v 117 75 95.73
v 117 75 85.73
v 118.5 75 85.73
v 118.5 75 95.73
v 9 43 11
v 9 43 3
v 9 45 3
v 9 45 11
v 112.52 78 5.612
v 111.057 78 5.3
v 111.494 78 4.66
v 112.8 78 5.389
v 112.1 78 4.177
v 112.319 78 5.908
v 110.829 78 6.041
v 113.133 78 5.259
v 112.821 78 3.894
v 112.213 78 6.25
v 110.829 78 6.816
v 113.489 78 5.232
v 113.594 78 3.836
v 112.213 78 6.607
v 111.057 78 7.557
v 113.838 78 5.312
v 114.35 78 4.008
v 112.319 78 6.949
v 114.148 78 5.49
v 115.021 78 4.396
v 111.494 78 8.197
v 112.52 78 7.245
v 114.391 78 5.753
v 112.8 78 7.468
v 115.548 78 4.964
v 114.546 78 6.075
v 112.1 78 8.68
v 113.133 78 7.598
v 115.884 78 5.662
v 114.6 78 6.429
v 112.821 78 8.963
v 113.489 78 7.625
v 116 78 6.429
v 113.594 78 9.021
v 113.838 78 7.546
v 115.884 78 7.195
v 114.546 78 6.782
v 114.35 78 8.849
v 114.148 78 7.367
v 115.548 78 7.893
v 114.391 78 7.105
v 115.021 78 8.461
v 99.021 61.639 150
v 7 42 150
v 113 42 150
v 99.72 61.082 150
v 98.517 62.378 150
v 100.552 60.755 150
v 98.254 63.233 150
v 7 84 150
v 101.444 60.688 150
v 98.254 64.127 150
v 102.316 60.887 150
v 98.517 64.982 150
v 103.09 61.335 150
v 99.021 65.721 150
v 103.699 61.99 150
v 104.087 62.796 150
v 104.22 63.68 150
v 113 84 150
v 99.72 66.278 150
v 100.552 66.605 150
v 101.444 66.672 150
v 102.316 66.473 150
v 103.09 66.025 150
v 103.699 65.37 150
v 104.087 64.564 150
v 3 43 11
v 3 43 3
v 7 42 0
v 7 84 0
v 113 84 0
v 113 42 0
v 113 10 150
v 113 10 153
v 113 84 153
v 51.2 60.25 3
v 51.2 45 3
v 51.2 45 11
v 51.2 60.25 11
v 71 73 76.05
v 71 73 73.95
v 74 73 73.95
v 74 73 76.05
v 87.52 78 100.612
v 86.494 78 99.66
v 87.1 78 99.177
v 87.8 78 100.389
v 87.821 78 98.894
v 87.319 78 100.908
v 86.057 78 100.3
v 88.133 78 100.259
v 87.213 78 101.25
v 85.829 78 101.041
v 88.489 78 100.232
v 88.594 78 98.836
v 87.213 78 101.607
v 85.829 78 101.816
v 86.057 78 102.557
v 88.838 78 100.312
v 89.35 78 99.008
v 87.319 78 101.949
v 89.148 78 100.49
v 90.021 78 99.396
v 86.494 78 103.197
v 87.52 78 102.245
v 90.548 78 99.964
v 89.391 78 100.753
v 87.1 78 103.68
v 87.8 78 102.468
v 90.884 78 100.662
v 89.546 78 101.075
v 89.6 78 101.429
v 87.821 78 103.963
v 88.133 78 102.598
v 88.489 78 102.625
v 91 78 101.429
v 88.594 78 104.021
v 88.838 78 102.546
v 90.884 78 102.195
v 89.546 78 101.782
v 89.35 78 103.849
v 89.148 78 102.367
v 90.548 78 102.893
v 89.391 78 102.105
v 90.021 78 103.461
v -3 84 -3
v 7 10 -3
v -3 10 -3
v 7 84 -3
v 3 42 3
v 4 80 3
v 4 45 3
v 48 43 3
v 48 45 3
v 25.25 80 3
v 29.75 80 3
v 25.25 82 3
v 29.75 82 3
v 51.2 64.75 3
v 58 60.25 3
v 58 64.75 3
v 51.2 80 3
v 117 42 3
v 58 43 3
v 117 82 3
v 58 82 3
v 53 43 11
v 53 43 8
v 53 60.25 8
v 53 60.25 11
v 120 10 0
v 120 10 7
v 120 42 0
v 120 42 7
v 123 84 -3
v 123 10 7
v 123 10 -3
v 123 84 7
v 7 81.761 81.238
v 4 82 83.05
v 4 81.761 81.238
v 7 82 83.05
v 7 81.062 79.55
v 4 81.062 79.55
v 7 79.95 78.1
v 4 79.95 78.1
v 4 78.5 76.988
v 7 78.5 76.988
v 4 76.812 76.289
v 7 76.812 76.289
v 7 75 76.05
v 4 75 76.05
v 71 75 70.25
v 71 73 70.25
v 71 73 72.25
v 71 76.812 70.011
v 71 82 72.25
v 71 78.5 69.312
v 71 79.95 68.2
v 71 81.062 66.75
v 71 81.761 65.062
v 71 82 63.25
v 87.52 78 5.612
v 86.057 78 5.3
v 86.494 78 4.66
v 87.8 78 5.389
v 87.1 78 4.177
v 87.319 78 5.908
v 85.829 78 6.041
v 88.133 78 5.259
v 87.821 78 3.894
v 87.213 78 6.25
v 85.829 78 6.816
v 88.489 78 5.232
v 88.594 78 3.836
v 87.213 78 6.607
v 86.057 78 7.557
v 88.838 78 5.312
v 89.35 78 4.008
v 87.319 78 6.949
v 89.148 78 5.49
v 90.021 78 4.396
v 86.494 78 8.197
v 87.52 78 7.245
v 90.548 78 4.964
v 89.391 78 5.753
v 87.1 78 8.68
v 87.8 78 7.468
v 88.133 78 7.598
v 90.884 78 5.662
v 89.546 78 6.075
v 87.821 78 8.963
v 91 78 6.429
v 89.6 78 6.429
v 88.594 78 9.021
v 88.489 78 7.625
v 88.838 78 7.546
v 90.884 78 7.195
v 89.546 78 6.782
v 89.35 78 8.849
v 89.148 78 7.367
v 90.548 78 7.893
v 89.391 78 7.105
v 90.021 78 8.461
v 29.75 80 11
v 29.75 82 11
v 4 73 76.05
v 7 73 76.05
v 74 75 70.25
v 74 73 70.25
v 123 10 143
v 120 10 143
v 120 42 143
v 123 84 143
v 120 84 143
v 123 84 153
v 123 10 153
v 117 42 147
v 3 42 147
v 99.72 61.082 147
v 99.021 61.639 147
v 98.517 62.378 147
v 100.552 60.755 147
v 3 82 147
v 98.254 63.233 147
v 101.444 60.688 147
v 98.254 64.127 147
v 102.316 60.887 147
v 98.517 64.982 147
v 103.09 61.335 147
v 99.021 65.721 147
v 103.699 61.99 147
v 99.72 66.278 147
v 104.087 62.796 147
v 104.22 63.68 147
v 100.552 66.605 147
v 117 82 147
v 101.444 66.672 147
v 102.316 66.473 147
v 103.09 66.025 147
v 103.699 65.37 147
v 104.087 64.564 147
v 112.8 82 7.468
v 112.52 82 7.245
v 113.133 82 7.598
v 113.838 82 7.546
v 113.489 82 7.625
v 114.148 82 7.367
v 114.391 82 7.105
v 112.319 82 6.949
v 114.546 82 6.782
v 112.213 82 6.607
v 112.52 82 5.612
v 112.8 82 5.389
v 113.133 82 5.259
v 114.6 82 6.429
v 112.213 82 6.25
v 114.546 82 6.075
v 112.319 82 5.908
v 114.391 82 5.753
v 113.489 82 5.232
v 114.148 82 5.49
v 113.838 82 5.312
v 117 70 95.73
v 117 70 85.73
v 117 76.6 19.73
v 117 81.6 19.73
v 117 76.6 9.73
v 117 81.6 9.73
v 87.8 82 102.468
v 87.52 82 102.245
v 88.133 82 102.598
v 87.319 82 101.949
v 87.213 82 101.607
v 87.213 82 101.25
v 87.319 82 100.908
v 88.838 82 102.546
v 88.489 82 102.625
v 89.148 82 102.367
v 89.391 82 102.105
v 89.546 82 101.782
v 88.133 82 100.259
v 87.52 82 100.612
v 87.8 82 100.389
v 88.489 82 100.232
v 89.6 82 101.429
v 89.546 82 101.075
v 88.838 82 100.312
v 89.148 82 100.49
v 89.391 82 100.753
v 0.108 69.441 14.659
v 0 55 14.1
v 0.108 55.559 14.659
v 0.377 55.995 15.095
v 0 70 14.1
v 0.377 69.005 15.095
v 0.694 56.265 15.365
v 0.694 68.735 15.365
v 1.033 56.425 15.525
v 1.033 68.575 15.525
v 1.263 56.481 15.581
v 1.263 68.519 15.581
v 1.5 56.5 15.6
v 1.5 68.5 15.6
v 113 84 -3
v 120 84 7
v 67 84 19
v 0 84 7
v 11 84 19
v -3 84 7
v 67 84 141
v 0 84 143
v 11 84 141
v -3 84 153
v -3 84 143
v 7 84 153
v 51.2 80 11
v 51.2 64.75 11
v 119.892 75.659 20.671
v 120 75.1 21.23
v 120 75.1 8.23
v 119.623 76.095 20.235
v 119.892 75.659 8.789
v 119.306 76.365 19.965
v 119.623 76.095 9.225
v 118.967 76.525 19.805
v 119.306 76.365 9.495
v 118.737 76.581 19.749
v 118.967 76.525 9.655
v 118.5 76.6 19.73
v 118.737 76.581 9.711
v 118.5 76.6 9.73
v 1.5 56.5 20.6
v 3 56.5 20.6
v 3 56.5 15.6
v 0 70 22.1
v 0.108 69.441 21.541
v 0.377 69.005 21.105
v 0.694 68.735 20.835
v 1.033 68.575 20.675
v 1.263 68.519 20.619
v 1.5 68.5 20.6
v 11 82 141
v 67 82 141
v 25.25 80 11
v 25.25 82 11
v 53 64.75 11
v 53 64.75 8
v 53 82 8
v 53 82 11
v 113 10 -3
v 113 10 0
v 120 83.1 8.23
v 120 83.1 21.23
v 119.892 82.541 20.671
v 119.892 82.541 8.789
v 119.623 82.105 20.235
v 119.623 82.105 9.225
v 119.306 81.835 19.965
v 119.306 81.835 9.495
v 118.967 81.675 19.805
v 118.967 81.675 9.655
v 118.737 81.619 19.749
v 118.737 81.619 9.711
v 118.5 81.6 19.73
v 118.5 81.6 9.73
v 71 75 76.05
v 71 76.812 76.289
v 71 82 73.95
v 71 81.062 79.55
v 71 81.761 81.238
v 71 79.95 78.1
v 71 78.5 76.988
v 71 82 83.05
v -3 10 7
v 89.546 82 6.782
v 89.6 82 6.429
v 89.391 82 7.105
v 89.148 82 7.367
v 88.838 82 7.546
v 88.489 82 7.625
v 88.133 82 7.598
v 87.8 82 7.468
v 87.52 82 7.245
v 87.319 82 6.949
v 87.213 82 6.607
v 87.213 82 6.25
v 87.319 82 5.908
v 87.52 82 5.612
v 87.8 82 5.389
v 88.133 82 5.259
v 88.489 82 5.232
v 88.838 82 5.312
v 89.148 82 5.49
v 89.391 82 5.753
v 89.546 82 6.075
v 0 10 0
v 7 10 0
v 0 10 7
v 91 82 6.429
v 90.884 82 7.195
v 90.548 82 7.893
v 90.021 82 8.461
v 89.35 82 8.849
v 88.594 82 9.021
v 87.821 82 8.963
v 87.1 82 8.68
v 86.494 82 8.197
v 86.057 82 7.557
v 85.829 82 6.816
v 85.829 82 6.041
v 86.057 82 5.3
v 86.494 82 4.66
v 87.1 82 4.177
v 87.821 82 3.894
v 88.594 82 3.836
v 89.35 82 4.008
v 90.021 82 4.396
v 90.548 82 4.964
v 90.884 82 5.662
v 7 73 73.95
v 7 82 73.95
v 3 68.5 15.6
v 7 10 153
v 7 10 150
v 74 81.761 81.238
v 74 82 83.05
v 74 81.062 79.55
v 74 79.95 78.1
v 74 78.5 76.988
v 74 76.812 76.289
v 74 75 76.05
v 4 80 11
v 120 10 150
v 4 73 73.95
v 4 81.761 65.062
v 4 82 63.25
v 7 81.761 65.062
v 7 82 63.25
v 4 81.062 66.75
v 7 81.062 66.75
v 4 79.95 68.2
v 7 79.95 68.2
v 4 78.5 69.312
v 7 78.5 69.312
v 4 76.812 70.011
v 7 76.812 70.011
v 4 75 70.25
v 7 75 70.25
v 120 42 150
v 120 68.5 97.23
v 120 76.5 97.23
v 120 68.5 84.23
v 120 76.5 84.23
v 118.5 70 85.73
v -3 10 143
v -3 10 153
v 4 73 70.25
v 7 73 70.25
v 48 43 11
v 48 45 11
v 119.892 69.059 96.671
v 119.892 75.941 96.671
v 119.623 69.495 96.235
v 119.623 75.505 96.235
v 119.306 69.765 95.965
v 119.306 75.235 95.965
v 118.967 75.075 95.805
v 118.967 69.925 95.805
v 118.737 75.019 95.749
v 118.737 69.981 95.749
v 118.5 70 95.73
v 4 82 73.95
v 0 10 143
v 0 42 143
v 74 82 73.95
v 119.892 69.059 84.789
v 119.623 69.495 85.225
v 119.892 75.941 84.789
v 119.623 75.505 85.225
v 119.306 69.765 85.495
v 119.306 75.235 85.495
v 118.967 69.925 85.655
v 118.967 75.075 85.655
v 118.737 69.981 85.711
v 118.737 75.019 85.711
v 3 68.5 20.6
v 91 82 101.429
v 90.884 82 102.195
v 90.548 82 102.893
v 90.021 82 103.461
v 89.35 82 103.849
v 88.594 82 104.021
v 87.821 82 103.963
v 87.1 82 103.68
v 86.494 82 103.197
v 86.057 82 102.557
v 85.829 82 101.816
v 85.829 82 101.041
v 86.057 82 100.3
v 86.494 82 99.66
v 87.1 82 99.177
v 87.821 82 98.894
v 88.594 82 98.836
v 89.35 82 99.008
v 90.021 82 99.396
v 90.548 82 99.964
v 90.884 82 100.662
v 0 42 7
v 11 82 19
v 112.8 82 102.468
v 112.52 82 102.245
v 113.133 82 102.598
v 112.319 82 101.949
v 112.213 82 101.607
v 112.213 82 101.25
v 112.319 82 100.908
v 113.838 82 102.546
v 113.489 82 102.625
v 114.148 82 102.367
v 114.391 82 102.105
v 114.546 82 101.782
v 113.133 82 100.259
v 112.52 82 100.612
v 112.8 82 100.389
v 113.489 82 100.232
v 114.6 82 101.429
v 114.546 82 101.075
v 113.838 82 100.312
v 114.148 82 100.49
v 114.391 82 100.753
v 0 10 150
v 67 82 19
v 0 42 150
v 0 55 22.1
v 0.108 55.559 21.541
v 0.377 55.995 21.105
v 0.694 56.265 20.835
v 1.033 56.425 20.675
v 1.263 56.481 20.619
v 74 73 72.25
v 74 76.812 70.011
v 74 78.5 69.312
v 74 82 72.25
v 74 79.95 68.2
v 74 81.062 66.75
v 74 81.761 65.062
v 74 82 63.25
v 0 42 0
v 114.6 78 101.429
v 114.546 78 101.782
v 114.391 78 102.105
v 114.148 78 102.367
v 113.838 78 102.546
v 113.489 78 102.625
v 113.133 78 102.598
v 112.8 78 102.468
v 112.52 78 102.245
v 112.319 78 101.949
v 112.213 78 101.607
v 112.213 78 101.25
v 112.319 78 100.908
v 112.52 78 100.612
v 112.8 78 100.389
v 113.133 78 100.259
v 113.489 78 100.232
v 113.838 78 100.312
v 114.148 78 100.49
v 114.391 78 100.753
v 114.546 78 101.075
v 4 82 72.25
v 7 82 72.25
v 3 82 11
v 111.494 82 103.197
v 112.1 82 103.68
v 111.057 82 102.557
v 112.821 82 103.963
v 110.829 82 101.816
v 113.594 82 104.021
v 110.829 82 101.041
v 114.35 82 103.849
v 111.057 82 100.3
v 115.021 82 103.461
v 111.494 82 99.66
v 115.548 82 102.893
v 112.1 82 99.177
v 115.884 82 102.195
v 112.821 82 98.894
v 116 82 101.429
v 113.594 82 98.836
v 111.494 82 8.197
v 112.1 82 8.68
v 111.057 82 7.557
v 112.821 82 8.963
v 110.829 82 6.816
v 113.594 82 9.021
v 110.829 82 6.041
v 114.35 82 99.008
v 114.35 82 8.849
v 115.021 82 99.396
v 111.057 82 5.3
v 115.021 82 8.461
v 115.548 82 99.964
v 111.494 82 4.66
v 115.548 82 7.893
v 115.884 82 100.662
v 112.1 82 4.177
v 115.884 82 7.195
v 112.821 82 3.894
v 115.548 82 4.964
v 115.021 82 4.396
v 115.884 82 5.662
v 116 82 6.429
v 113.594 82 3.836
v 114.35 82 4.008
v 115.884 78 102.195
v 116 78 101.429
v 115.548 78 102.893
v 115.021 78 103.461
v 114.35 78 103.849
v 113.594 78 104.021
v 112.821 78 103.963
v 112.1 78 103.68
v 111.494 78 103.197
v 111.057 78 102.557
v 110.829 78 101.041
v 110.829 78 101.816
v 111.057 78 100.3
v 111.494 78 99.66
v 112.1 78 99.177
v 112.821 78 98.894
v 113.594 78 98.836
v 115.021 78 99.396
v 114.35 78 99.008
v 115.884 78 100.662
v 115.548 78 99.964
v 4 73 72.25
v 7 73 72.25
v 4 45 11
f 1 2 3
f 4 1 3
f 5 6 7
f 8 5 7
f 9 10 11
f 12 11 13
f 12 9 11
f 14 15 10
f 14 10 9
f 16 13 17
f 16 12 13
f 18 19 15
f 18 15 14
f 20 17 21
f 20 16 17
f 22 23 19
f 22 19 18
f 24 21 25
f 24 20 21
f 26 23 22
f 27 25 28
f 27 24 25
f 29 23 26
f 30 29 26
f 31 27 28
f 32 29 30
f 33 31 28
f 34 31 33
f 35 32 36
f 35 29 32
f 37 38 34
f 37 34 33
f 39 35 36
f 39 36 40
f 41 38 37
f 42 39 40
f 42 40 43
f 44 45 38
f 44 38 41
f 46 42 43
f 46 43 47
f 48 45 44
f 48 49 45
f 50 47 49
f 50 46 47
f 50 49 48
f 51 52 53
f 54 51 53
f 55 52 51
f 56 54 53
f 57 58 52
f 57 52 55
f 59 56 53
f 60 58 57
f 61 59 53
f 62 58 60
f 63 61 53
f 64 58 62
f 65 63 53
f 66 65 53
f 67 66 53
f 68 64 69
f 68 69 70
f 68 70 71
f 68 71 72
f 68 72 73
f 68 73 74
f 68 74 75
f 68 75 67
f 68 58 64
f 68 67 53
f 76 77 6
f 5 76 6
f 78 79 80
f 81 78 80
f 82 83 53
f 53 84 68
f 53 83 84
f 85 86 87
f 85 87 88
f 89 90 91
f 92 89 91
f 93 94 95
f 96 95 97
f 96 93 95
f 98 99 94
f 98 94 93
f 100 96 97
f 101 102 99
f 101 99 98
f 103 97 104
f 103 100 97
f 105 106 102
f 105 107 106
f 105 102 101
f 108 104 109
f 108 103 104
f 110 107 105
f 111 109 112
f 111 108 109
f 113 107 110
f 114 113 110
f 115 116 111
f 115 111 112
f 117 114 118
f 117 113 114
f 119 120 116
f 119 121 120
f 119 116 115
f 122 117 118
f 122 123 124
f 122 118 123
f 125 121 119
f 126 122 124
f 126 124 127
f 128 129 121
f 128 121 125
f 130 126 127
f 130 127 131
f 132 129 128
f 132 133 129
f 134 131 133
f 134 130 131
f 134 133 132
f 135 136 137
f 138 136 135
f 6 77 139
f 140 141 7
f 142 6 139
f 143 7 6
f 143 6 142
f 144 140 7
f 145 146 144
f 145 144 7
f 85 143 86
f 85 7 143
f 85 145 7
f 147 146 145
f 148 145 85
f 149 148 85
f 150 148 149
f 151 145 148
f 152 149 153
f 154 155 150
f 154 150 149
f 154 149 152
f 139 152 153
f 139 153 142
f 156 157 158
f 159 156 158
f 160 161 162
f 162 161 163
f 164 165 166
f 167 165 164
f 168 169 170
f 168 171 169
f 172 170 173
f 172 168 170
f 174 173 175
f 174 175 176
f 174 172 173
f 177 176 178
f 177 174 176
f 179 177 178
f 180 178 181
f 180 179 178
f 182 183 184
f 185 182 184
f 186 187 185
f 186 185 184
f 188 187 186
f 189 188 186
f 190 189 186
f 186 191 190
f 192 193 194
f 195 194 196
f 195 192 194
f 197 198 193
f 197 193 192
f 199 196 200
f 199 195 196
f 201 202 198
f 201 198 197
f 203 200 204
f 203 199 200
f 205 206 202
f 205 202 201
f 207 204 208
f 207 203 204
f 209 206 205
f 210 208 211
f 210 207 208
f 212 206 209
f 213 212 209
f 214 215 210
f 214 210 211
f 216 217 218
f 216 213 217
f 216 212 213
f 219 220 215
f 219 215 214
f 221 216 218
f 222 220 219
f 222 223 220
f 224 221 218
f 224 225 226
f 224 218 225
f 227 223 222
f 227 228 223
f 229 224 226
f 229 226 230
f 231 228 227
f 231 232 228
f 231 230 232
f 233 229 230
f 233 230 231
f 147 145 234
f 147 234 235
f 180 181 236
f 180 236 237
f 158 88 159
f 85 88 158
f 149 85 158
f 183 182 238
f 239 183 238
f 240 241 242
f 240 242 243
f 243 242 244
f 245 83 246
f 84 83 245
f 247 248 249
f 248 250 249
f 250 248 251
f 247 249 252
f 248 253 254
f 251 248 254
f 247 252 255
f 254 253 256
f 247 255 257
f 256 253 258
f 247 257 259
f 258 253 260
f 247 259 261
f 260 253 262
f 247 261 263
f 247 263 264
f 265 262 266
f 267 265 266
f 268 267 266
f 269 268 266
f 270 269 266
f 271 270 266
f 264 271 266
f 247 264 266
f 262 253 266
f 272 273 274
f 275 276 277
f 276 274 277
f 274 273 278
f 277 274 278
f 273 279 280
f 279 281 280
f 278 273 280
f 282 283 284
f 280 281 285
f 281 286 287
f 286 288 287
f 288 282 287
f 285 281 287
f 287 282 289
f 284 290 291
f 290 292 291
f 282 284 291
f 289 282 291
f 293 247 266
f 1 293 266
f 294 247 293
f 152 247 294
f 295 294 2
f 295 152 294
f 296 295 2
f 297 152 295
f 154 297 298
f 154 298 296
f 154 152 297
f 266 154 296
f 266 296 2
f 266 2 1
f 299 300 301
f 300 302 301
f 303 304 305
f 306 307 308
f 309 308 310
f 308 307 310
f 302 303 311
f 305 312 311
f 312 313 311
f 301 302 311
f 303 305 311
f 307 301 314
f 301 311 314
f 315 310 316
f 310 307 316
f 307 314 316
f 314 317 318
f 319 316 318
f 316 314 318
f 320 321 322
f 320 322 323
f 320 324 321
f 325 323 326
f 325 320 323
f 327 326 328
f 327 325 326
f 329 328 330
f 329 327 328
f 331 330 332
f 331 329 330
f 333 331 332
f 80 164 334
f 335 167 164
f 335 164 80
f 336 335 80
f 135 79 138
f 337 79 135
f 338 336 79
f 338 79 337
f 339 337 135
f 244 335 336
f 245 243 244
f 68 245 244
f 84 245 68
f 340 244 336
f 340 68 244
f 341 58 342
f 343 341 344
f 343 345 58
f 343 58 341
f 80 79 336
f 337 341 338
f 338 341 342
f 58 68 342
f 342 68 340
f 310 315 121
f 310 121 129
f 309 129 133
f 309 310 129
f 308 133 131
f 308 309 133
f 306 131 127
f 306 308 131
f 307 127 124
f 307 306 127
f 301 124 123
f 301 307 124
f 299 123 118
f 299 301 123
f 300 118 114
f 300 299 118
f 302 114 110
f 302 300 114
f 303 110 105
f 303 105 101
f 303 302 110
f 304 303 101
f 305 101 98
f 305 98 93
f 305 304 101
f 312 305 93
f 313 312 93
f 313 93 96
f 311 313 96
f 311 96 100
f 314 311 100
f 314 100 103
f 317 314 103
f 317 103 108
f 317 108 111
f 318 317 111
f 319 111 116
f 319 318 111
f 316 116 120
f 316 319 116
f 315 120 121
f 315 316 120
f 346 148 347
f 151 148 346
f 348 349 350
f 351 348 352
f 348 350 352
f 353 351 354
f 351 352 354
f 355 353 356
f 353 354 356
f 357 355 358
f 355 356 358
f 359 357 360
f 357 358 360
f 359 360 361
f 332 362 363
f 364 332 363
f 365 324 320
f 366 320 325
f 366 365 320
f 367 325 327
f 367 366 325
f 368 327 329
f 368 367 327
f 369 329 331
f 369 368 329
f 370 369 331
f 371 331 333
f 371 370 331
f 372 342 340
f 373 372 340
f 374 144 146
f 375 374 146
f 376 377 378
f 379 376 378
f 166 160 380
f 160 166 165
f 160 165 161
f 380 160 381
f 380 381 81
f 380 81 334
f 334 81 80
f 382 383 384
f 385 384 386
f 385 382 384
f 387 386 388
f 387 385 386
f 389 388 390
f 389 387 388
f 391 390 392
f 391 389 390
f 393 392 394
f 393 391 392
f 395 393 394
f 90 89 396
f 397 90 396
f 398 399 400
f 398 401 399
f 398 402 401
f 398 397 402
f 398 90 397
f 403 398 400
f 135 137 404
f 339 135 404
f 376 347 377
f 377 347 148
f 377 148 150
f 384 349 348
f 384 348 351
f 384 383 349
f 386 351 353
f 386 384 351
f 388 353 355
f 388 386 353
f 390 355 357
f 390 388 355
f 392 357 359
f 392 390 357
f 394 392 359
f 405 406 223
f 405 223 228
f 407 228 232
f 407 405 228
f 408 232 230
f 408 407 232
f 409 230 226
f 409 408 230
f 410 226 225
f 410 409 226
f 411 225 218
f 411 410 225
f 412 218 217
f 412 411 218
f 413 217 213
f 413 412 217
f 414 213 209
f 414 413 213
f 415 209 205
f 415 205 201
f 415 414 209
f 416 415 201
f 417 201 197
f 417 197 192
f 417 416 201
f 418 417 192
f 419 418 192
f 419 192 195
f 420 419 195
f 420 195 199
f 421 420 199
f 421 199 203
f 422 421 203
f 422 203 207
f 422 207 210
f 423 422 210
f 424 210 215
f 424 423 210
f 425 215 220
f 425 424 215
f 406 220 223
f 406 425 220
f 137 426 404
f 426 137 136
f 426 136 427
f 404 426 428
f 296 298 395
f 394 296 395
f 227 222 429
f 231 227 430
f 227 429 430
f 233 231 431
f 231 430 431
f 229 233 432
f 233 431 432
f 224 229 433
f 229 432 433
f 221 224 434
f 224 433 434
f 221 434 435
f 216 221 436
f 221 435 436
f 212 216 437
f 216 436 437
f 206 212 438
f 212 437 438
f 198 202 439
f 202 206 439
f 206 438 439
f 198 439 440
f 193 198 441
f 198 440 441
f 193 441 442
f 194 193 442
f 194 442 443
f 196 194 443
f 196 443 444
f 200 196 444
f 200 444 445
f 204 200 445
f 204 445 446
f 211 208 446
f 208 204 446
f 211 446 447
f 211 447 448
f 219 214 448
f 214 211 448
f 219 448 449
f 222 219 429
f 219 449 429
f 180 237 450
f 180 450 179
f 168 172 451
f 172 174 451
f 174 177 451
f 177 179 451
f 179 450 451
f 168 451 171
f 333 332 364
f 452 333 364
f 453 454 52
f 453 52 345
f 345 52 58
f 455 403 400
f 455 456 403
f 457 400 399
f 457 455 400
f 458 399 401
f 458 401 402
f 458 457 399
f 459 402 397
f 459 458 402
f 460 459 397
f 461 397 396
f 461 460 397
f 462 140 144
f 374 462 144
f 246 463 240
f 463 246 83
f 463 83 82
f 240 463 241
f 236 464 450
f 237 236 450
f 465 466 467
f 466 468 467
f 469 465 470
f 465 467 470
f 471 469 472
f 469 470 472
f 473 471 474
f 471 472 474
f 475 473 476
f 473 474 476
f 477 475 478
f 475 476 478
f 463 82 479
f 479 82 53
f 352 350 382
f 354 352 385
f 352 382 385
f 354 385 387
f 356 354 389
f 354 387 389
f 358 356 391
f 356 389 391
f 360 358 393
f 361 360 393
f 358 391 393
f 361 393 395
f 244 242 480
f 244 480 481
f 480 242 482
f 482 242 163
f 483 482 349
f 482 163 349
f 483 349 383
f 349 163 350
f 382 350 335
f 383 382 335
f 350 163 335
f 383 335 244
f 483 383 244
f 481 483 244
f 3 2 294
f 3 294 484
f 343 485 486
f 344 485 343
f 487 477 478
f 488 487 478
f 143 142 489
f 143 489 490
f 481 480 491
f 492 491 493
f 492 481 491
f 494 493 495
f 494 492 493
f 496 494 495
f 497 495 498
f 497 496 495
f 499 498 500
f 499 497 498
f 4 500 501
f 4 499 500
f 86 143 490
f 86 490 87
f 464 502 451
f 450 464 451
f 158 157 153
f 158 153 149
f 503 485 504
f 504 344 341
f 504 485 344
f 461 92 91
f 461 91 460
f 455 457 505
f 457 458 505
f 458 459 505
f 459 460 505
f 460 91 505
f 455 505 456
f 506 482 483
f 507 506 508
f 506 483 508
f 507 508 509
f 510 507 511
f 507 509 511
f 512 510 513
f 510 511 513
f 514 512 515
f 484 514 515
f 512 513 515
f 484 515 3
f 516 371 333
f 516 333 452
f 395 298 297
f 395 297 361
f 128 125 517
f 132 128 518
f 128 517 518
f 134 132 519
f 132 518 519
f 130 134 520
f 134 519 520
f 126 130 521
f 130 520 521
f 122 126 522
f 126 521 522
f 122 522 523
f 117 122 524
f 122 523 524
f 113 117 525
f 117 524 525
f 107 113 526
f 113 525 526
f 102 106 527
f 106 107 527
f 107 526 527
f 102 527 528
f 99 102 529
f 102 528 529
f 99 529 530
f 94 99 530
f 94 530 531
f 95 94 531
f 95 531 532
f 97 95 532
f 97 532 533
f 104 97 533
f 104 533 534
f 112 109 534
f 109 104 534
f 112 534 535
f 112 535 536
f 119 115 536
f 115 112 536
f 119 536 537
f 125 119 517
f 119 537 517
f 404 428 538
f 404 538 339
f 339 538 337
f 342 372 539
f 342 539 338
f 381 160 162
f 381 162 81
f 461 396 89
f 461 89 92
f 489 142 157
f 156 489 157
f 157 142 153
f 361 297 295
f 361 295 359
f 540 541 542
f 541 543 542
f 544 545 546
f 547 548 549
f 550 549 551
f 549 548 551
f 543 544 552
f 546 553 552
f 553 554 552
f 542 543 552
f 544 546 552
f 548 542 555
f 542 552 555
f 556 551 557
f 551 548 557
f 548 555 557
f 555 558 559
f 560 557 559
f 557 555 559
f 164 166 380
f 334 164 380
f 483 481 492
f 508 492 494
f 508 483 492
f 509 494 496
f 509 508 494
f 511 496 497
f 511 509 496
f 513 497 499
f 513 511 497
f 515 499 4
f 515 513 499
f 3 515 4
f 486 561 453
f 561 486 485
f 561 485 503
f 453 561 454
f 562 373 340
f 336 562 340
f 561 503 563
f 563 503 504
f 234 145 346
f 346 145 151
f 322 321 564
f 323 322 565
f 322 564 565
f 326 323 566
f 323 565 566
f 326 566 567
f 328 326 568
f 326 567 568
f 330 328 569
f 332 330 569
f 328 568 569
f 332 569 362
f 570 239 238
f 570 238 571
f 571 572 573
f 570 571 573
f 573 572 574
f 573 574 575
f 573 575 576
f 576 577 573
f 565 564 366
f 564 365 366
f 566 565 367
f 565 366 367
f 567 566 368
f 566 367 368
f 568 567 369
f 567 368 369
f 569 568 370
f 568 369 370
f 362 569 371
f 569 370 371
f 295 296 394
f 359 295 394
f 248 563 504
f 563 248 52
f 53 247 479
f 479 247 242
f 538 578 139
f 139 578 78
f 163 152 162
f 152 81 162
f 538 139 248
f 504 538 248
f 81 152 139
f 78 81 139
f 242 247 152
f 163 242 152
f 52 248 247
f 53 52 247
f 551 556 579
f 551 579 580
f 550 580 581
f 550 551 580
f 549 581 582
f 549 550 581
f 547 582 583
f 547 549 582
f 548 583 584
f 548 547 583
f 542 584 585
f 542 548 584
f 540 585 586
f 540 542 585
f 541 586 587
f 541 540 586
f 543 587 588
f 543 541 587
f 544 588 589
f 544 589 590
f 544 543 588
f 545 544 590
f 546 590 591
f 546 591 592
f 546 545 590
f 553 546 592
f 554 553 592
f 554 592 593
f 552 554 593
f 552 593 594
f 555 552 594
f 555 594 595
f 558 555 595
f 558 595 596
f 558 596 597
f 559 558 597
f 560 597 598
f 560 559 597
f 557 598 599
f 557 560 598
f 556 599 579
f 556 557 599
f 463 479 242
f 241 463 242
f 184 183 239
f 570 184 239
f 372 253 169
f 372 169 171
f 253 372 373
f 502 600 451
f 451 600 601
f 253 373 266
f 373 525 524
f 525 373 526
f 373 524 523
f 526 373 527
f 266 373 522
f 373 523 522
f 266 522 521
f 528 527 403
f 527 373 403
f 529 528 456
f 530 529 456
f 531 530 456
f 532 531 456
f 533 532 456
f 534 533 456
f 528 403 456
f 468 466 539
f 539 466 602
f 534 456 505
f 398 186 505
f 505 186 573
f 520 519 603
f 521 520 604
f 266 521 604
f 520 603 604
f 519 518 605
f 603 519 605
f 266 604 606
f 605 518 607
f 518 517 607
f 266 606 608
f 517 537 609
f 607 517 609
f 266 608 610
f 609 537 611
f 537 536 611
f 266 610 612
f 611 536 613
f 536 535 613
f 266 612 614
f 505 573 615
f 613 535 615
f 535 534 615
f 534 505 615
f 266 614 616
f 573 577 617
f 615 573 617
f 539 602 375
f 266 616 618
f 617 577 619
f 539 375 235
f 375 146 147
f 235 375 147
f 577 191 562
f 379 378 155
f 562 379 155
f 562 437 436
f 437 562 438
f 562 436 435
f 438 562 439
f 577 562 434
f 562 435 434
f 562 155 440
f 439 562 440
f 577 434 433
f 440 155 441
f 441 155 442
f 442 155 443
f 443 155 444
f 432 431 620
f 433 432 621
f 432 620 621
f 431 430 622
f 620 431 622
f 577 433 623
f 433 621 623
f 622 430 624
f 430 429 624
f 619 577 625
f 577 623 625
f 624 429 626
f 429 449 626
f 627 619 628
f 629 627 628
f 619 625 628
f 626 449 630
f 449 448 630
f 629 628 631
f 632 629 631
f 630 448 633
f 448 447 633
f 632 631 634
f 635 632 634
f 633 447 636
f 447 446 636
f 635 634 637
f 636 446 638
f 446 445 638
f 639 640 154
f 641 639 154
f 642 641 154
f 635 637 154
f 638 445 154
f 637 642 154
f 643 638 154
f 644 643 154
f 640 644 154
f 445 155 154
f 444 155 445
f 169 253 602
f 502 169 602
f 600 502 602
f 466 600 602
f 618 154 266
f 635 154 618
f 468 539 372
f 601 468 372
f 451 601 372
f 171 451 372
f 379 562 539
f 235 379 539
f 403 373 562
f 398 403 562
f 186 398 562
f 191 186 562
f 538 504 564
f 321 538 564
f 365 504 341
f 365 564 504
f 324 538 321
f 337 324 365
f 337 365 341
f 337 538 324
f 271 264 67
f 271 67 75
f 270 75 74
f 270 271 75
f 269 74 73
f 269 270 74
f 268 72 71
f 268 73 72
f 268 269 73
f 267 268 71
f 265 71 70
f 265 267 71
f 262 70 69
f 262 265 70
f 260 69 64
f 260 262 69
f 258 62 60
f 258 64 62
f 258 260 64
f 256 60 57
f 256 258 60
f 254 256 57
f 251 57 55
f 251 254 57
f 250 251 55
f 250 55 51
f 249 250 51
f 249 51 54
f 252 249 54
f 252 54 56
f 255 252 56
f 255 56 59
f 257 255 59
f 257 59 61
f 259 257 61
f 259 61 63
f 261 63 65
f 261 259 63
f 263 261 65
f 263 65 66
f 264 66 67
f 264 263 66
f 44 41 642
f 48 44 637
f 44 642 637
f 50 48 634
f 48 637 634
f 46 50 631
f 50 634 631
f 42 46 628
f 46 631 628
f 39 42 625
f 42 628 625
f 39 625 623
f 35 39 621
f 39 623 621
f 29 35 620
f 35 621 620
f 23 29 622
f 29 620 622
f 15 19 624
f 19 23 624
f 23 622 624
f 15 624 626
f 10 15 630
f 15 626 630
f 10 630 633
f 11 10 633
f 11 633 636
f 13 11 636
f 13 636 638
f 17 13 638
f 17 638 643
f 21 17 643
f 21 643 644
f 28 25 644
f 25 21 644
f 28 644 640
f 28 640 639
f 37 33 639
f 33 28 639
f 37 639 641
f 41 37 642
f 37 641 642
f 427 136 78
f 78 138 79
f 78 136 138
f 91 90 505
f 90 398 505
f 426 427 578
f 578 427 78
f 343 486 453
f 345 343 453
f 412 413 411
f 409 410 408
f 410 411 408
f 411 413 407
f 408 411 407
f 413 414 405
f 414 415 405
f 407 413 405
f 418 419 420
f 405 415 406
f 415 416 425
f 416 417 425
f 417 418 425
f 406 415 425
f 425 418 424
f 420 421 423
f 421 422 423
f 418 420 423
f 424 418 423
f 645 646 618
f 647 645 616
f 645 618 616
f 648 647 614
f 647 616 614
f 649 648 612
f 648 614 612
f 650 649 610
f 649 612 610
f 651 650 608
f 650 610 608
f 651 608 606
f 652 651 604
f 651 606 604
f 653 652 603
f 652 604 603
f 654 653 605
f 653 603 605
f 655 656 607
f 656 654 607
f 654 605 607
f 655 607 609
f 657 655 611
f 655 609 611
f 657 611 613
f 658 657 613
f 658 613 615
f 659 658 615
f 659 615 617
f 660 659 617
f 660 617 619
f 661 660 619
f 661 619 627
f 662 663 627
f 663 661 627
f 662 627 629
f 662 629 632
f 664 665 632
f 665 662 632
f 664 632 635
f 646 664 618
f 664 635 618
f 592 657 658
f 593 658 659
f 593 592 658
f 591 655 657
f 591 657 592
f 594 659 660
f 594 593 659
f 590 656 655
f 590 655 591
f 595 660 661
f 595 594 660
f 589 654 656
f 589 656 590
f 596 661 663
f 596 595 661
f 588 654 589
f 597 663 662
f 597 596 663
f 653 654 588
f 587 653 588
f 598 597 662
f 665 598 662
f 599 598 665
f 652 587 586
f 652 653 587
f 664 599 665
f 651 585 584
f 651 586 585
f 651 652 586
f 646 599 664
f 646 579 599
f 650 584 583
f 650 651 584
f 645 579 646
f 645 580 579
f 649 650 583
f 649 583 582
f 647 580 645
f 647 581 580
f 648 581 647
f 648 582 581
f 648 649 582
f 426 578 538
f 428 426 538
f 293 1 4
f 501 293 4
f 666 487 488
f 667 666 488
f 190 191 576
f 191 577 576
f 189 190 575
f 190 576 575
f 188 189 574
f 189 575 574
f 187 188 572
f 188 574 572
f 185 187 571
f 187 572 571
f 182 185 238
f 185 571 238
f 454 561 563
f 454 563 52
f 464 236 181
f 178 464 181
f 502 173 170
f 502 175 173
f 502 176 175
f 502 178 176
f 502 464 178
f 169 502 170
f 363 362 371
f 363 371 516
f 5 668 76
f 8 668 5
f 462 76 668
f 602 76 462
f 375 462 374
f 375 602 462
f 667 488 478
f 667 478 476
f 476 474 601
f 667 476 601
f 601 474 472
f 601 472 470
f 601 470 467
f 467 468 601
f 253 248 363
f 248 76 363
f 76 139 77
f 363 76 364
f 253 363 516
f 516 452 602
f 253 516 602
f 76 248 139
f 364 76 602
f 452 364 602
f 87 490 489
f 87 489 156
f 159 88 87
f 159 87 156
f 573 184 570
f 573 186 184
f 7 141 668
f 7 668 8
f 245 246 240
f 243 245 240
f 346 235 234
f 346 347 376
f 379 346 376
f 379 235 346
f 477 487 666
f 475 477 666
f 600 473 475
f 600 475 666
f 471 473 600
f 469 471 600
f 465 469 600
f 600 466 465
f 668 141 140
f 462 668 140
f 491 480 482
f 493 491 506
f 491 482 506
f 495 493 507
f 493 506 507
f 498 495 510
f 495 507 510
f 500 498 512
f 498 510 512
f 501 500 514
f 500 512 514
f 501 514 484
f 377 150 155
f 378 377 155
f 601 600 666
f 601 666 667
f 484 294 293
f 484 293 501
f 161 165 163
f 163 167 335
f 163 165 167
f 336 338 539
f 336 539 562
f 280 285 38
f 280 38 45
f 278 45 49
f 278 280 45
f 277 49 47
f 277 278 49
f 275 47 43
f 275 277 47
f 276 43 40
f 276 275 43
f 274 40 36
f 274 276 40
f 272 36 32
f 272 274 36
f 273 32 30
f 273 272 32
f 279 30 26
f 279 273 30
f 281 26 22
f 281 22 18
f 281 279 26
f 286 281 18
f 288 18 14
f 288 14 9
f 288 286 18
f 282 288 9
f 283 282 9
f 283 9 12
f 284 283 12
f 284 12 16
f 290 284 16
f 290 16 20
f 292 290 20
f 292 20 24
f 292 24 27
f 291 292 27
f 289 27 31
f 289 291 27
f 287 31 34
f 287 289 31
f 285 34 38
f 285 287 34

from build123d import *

# Parameters (mm, degrees)
CYLINDER002_R             = 3
CYLINDER002_DEPTH         = 10
BOX040_W                  = 56
BOX040_H                  = 10
BOX040_DEPTH              = 122
BOX021_W                  = 47.2
BOX021_H                  = 35
BOX021_DEPTH              = 8
BOX023_W                  = 4.5
BOX023_H                  = 2
BOX023_DEPTH              = 8
BOX022_W                  = 2
BOX022_H                  = 4.5
BOX022_DEPTH              = 8
BOX020_W                  = 17
BOX020_H                  = 5
BOX020_DEPTH              = 12
BOX018_W                  = 48.5
BOX018_H                  = 4.6
BOX018_DEPTH              = 25.5
FUSION005_PLACEMENT_ANGLE = 90
BOX029_W                  = 10
BOX029_H                  = 5
BOX029_DEPTH              = 10
BOX027_W                  = 29.6
BOX027_H                  = 2
BOX027_DEPTH              = 99.5
BOX028_W                  = 10
BOX028_H                  = 5
BOX028_DEPTH              = 10
BOX035_W                  = 10
BOX035_H                  = 77
BOX035_DEPTH              = 10
BOX034_W                  = 10
BOX034_H                  = 74
BOX034_DEPTH              = 10
CUT016_PLACEMENT_ANGLE    = 90
BOX037_W                  = 10
BOX037_H                  = 77
BOX037_DEPTH              = 10
BOX036_W                  = 10
BOX036_H                  = 74
BOX036_DEPTH              = 10
CUT017_PLACEMENT_ANGLE    = 90
BOX039_W                  = 10
BOX039_H                  = 77
BOX039_DEPTH              = 10
BOX038_W                  = 10
BOX038_H                  = 74
BOX038_DEPTH              = 10
CUT018_PLACEMENT_ANGLE    = 180
BOX033_W                  = 10
BOX033_H                  = 77
BOX033_DEPTH              = 10
BOX017_W                  = 10
BOX017_H                  = 74
BOX017_DEPTH              = 10
BOX032_W                  = 39
BOX032_H                  = 10
BOX032_DEPTH              = 10
BOX024_W                  = 50
BOX024_H                  = 39
BOX024_DEPTH              = 8
BOX026_W                  = 72
BOX026_H                  = 18
BOX026_DEPTH              = 1.7
BOX025_W                  = 3
BOX025_H                  = 10
BOX025_DEPTH              = 5.8
ARRAY005_X_COUNT          = 2
ARRAY005_X_PITCH          = 67
CYLINDER001_R             = 1.2
CYLINDER001_DEPTH         = 4
CYLINDER_R                = 2.6
CYLINDER_DEPTH            = 4
ARRAY006_X_COUNT          = 2
ARRAY006_X_PITCH          = 25
ARRAY006_Z_COUNT          = 2
ARRAY006_Z_PITCH          = 95
BOX016_W                  = 114
BOX016_H                  = 50
BOX016_DEPTH              = 144
BOX015_W                  = 120
BOX015_H                  = 42
BOX015_DEPTH              = 150
FILLET001_R               = 7
CHAMFER_SIZE              = 5
FILLET002_R               = 1.5


with BuildPart() as cilindro002:
    # Cylinder002 → Cylinder002 (new body)
    with BuildSketch(Plane(origin=(101.22, 63.68, 142.21), x_dir=(1, 0, 0), z_dir=(0, 0, 1))):
        Circle(CYLINDER002_R)
    extrude(amount=CYLINDER002_DEPTH)


with BuildPart() as cubo021:
    # Box040 → Box040 (new body)
    with BuildSketch(Plane(origin=(11, 81, 19), x_dir=(1, 0, 0), z_dir=(0, 0, 1))):
        with Locations((28, 5)):
            Rectangle(BOX040_W, BOX040_H)
    extrude(amount=BOX040_DEPTH)


with BuildPart() as protoboard:
    # Box021 → Box021 (new body)
    with BuildSketch(Plane.XY):
        with Locations((23.6, 17.5)):
            Rectangle(BOX021_W, BOX021_H)
    extrude(amount=BOX021_DEPTH)


with BuildPart() as salida_proto001:
    # Box023 → Box023 (new body)
    with BuildSketch(Plane(origin=(21.25, 35, 0), x_dir=(1, 0, 0), z_dir=(0, 0, 1))):
        with Locations((2.25, 1)):
            Rectangle(BOX023_W, BOX023_H)
    extrude(amount=BOX023_DEPTH)


with BuildPart() as salida_proto:
    # Box022 → Box022 (new body)
    with BuildSketch(Plane(origin=(47, 15.25, 0), x_dir=(1, 0, 0), z_dir=(0, 0, 1))):
        with Locations((1, 2.25)):
            Rectangle(BOX022_W, BOX022_H)
    extrude(amount=BOX022_DEPTH)


with BuildPart() as cubo010:
    # Box020 → Box020 (new body)
    with BuildSketch(Plane(origin=(-7, 5, 6.75), x_dir=(1, 0, 0), z_dir=(0, 0, 1))):
        with Locations((8.5, 2.5)):
            Rectangle(BOX020_W, BOX020_H)
    extrude(amount=BOX020_DEPTH)


with BuildPart() as proto_nodemcu:
    # Box018 → Box018 (new body)
    with BuildSketch(Plane(origin=(0, 0.4, 0), x_dir=(1, 0, 0), z_dir=(0, 0, 1))):
        with Locations((24.25, 2.3)):
            Rectangle(BOX018_W, BOX018_H)
    extrude(amount=BOX018_DEPTH)

    # Fusion005: union Cubo010
    add(cubo010.part)


with BuildPart() as proto_nodemcu_1:
    # Fusion005 placement: moved
    add(proto_nodemcu.part.moved(Location((-0.75, 30.25, 7.6))).rotate(Axis((-0.75, 30.25, 7.6), (1, 0, 0)), FUSION005_PLACEMENT_ANGLE))

    # Fusion006: union protoboard, salida_proto001, salida_proto
    add(protoboard.part)
    add(salida_proto001.part)
    add(salida_proto.part)


with BuildPart() as proto_nodemcu_2:
    # Fusion006 placement: moved
    add(proto_nodemcu_1.part.moved(Location((4, 45, 3))))


with BuildPart() as on_off:
    # Box029 → Box029 (new body)
    with BuildSketch(Plane(origin=(26, -6, 81.5), x_dir=(1, 0, 0), z_dir=(0, 0, 1))):
        with Locations((5, 2.5)):
            Rectangle(BOX029_W, BOX029_H)
    extrude(amount=BOX029_DEPTH)


with BuildPart() as base_pilas:
    # Box027 → Box027 (new body)
    with BuildSketch(Plane.XY):
        with Locations((14.8, 1)):
            Rectangle(BOX027_W, BOX027_H)
    extrude(amount=BOX027_DEPTH)


with BuildPart() as fusion011:
    # Box028 → Box028 (new body)
    with BuildSketch(Plane(origin=(26, 0.6, 5.5), x_dir=(1, 0, 0), z_dir=(0, 0, 1))):
        with Locations((5, 2.5)):
            Rectangle(BOX028_W, BOX028_H)
    extrude(amount=BOX028_DEPTH)

    # Fusion008: union on_off, base_pilas
    add(on_off.part)
    add(base_pilas.part)


with BuildPart() as fusion011_1:
    # Fusion008 placement: moved
    add(fusion011.part.moved(Location((85.8, 76, 4.23))))

    # Fusion011: union proto_nodemcu
    add(proto_nodemcu_2.part)


with BuildPart() as cubo016:
    # Box035 → Box035 (new body)
    with BuildSketch(Plane(origin=(0, 10, 140), x_dir=(1, 0, 0), z_dir=(0, 0, 1))):
        with Locations((5, 38.5)):
            Rectangle(BOX035_W, BOX035_H)
    extrude(amount=BOX035_DEPTH)


with BuildPart() as cut016:
    # Box034 → Box034 (new body)
    with BuildSketch(Plane(origin=(-3, 10, 143), x_dir=(1, 0, 0), z_dir=(0, 0, 1))):
        with Locations((5, 37)):
            Rectangle(BOX034_W, BOX034_H)
    extrude(amount=BOX034_DEPTH)

    # Cut016: cut Cubo016
    add(cubo016.part, mode=Mode.SUBTRACT)


with BuildPart() as cut016_1:
    # Cut016 placement: moved
    add(cut016.part.moved(Location((-30, 0, 150))).rotate(Axis((-30, 0, 150), (0, 1, 0)), CUT016_PLACEMENT_ANGLE))


with BuildPart() as cubo018:
    # Box037 → Box037 (new body)
    with BuildSketch(Plane(origin=(0, 10, 140), x_dir=(1, 0, 0), z_dir=(0, 0, 1))):
        with Locations((5, 38.5)):
            Rectangle(BOX037_W, BOX037_H)
    extrude(amount=BOX037_DEPTH)


with BuildPart() as cut017:
    # Box036 → Box036 (new body)
    with BuildSketch(Plane(origin=(-3, 10, 143), x_dir=(1, 0, 0), z_dir=(0, 0, 1))):
        with Locations((5, 37)):
            Rectangle(BOX036_W, BOX036_H)
    extrude(amount=BOX036_DEPTH)

    # Cut017: cut Cubo018
    add(cubo018.part, mode=Mode.SUBTRACT)


with BuildPart() as cut017_1:
    # Cut017 placement: moved
    add(cut017.part.moved(Location((150, 0, 0))).rotate(Axis((150, 0, 0), (0, -1, 0)), CUT017_PLACEMENT_ANGLE))


with BuildPart() as cubo020:
    # Box039 → Box039 (new body)
    with BuildSketch(Plane(origin=(0, 10, 140), x_dir=(1, 0, 0), z_dir=(0, 0, 1))):
        with Locations((5, 38.5)):
            Rectangle(BOX039_W, BOX039_H)
    extrude(amount=BOX039_DEPTH)


with BuildPart() as cut018:
    # Box038 → Box038 (new body)
    with BuildSketch(Plane(origin=(-3, 10, 143), x_dir=(1, 0, 0), z_dir=(0, 0, 1))):
        with Locations((5, 37)):
            Rectangle(BOX038_W, BOX038_H)
    extrude(amount=BOX038_DEPTH)

    # Cut018: cut Cubo020
    add(cubo020.part, mode=Mode.SUBTRACT)


with BuildPart() as cut018_1:
    # Cut018 placement: moved
    add(cut018.part.moved(Location((120, 0, 150))).rotate(Axis((120, 0, 150), (0, 1, 0)), CUT018_PLACEMENT_ANGLE))


with BuildPart() as cubo014:
    # Box033 → Box033 (new body)
    with BuildSketch(Plane(origin=(0, 10, 140), x_dir=(1, 0, 0), z_dir=(0, 0, 1))):
        with Locations((5, 38.5)):
            Rectangle(BOX033_W, BOX033_H)
    extrude(amount=BOX033_DEPTH)


with BuildPart() as soportes_frontis:
    # Box017 → Box017 (new body)
    with BuildSketch(Plane(origin=(-3, 10, 143), x_dir=(1, 0, 0), z_dir=(0, 0, 1))):
        with Locations((5, 37)):
            Rectangle(BOX017_W, BOX017_H)
    extrude(amount=BOX017_DEPTH)

    # Cut015: cut Cubo014
    add(cubo014.part, mode=Mode.SUBTRACT)

    # Fusion009: union Cut016, Cut017, Cut018
    add(cut016_1.part)
    add(cut017_1.part)
    add(cut018_1.part)


with BuildPart() as cubo013:
    # Box032 → Box032 (new body)
    with BuildSketch(Plane(origin=(9, 43, 3), x_dir=(1, 0, 0), z_dir=(0, 0, 1))):
        with Locations((19.5, 5)):
            Rectangle(BOX032_W, BOX032_H)
    extrude(amount=BOX032_DEPTH)


with BuildPart() as baseproto:
    # Box024 → Box024 (new body)
    with BuildSketch(Plane(origin=(3, 43, 3), x_dir=(1, 0, 0), z_dir=(0, 0, 1))):
        with Locations((25, 19.5)):
            Rectangle(BOX024_W, BOX024_H)
    extrude(amount=BOX024_DEPTH)

    # Cut014: cut Cubo013
    add(cubo013.part, mode=Mode.SUBTRACT)


with BuildPart() as leds:
    # Box026 → Box026 (new body)
    with BuildSketch(Plane(origin=(-1, 0, 2), x_dir=(1, 0, 0), z_dir=(0, 0, 1))):
        with Locations((36, 9)):
            Rectangle(BOX026_W, BOX026_H)
    extrude(amount=BOX026_DEPTH)


with BuildPart() as soporte_placa_leds:
    # Box025 → Box025 (new body)
    with BuildSketch(Plane(origin=(0, 8, 0), x_dir=(1, 0, 0), z_dir=(0, 0, 1))):
        with Locations((1.5, 5)):
            Rectangle(BOX025_W, BOX025_H)
    extrude(amount=BOX025_DEPTH)

    # Array005 X: soporte_placa_leds ×2


with BuildPart() as soporte_placa_leds_1:
    add(soporte_placa_leds.part)
    with Locations(*[(i * ARRAY005_X_PITCH, 0, 0) for i in range(1, ARRAY005_X_COUNT)]):
        add(soporte_placa_leds.part)

    # Cut012: cut leds
    add(leds.part, mode=Mode.SUBTRACT)


with BuildPart() as soporte_placa_leds_2:
    # Cut012 placement: moved
    add(soporte_placa_leds_1.part.moved(Location((4, 65, 70.25))))


with BuildPart() as cilindro001:
    # Cylinder001 → Cylinder001 (new body)
    with BuildSketch(Plane(origin=(2.6, 0, 2.6), x_dir=(1, 0, 0), z_dir=(0, -1, 0))):
        Circle(CYLINDER001_R)
    extrude(amount=CYLINDER001_DEPTH)


with BuildPart() as array006:
    # Cylinder → Cylinder (new body)
    with BuildSketch(Plane(origin=(2.6, 0, 2.6), x_dir=(1, 0, 0), z_dir=(0, -1, 0))):
        Circle(CYLINDER_R)
    extrude(amount=CYLINDER_DEPTH)

    # Cut013: cut Cilindro001
    add(cilindro001.part, mode=Mode.SUBTRACT)


with BuildPart() as array006_1:
    # Cut013 placement: moved
    add(array006.part.moved(Location((31.199794, 82, -20.171414))))

    # Array006 X: Array006 ×2


with BuildPart() as array006_2:
    add(array006_1.part)
    with Locations(*[(i * ARRAY006_X_PITCH, 0, 0) for i in range(1, ARRAY006_X_COUNT)]):
        add(array006_1.part)

    # Array006 Z: Array006 ×2


with BuildPart() as array006_3:
    add(array006_2.part)
    with Locations(*[(0, 0, i * ARRAY006_Z_PITCH) for i in range(1, ARRAY006_Z_COUNT)]):
        add(array006_2.part)


with BuildPart() as array006_4:
    # Array006 placement: moved
    add(array006_3.part.moved(Location((54.6, 0, 24))))


with BuildPart() as cubo006:
    # Box016 → Box016 (new body)
    with BuildSketch(Plane(origin=(3, 32, 3), x_dir=(1, 0, 0), z_dir=(0, 0, 1))):
        with Locations((57, 25)):
            Rectangle(BOX016_W, BOX016_H)
    extrude(amount=BOX016_DEPTH)


with BuildPart() as closet_bottom_esp8266:
    # Box015 → Box015 (new body)
    with BuildSketch(Plane(origin=(0, 42, 0), x_dir=(1, 0, 0), z_dir=(0, 0, 1))):
        with Locations((60, 21)):
            Rectangle(BOX015_W, BOX015_H)
    extrude(amount=BOX015_DEPTH)

    # Cut010: cut Cubo006
    add(cubo006.part, mode=Mode.SUBTRACT)

    # Fusion010: union soportes_frontis, baseProto, soporte_placa_leds, Array006
    add(soportes_frontis.part)
    add(baseproto.part)
    add(soporte_placa_leds_2.part)
    add(array006_4.part)

    # Cut019: cut Fusion011
    add(fusion011_1.part, mode=Mode.SUBTRACT)

    # Cut020: cut Cubo021
    add(cubo021.part, mode=Mode.SUBTRACT)

    # Cut021: cut Cilindro002
    add(cilindro002.part, mode=Mode.SUBTRACT)

    # Fillet001
    fillet001_edges = [closet_bottom_esp8266.edges().sort_by_distance(p)[0] for p in [
        (5.5, 82, 70.25),
        (5.5, 82, 76.05),
        (72.5, 82, 70.25),
        (72.5, 82, 76.05),
    ]]
    fillet(fillet001_edges, radius=FILLET001_R)

    # Chamfer
    chamfer_edges = [closet_bottom_esp8266.edges().sort_by_distance(p)[0] for p in [
        (53, 51.625, 3),
        (53, 73.375, 3),
    ]]
    chamfer(chamfer_edges, length=CHAMFER_SIZE)

    # Fillet002
    fillet002_edges = [closet_bottom_esp8266.edges().sort_by_distance(p)[0] for p in [
        (120, 79.1, 19.73),
        (120, 76.6, 14.73),
        (120, 79.1, 9.73),
        (120, 81.6, 14.73),
        (120, 72.5, 85.73),
        (120, 75, 90.73),
        (120, 72.5, 95.73),
        (120, 70, 90.73),
        (0, 68.5, 18.1),
        (0, 62.5, 20.6),
        (0, 56.5, 18.1),
        (0, 62.5, 15.6),
    ]]
    fillet(fillet002_edges, radius=FILLET002_R)


solid = closet_bottom_esp8266.part
